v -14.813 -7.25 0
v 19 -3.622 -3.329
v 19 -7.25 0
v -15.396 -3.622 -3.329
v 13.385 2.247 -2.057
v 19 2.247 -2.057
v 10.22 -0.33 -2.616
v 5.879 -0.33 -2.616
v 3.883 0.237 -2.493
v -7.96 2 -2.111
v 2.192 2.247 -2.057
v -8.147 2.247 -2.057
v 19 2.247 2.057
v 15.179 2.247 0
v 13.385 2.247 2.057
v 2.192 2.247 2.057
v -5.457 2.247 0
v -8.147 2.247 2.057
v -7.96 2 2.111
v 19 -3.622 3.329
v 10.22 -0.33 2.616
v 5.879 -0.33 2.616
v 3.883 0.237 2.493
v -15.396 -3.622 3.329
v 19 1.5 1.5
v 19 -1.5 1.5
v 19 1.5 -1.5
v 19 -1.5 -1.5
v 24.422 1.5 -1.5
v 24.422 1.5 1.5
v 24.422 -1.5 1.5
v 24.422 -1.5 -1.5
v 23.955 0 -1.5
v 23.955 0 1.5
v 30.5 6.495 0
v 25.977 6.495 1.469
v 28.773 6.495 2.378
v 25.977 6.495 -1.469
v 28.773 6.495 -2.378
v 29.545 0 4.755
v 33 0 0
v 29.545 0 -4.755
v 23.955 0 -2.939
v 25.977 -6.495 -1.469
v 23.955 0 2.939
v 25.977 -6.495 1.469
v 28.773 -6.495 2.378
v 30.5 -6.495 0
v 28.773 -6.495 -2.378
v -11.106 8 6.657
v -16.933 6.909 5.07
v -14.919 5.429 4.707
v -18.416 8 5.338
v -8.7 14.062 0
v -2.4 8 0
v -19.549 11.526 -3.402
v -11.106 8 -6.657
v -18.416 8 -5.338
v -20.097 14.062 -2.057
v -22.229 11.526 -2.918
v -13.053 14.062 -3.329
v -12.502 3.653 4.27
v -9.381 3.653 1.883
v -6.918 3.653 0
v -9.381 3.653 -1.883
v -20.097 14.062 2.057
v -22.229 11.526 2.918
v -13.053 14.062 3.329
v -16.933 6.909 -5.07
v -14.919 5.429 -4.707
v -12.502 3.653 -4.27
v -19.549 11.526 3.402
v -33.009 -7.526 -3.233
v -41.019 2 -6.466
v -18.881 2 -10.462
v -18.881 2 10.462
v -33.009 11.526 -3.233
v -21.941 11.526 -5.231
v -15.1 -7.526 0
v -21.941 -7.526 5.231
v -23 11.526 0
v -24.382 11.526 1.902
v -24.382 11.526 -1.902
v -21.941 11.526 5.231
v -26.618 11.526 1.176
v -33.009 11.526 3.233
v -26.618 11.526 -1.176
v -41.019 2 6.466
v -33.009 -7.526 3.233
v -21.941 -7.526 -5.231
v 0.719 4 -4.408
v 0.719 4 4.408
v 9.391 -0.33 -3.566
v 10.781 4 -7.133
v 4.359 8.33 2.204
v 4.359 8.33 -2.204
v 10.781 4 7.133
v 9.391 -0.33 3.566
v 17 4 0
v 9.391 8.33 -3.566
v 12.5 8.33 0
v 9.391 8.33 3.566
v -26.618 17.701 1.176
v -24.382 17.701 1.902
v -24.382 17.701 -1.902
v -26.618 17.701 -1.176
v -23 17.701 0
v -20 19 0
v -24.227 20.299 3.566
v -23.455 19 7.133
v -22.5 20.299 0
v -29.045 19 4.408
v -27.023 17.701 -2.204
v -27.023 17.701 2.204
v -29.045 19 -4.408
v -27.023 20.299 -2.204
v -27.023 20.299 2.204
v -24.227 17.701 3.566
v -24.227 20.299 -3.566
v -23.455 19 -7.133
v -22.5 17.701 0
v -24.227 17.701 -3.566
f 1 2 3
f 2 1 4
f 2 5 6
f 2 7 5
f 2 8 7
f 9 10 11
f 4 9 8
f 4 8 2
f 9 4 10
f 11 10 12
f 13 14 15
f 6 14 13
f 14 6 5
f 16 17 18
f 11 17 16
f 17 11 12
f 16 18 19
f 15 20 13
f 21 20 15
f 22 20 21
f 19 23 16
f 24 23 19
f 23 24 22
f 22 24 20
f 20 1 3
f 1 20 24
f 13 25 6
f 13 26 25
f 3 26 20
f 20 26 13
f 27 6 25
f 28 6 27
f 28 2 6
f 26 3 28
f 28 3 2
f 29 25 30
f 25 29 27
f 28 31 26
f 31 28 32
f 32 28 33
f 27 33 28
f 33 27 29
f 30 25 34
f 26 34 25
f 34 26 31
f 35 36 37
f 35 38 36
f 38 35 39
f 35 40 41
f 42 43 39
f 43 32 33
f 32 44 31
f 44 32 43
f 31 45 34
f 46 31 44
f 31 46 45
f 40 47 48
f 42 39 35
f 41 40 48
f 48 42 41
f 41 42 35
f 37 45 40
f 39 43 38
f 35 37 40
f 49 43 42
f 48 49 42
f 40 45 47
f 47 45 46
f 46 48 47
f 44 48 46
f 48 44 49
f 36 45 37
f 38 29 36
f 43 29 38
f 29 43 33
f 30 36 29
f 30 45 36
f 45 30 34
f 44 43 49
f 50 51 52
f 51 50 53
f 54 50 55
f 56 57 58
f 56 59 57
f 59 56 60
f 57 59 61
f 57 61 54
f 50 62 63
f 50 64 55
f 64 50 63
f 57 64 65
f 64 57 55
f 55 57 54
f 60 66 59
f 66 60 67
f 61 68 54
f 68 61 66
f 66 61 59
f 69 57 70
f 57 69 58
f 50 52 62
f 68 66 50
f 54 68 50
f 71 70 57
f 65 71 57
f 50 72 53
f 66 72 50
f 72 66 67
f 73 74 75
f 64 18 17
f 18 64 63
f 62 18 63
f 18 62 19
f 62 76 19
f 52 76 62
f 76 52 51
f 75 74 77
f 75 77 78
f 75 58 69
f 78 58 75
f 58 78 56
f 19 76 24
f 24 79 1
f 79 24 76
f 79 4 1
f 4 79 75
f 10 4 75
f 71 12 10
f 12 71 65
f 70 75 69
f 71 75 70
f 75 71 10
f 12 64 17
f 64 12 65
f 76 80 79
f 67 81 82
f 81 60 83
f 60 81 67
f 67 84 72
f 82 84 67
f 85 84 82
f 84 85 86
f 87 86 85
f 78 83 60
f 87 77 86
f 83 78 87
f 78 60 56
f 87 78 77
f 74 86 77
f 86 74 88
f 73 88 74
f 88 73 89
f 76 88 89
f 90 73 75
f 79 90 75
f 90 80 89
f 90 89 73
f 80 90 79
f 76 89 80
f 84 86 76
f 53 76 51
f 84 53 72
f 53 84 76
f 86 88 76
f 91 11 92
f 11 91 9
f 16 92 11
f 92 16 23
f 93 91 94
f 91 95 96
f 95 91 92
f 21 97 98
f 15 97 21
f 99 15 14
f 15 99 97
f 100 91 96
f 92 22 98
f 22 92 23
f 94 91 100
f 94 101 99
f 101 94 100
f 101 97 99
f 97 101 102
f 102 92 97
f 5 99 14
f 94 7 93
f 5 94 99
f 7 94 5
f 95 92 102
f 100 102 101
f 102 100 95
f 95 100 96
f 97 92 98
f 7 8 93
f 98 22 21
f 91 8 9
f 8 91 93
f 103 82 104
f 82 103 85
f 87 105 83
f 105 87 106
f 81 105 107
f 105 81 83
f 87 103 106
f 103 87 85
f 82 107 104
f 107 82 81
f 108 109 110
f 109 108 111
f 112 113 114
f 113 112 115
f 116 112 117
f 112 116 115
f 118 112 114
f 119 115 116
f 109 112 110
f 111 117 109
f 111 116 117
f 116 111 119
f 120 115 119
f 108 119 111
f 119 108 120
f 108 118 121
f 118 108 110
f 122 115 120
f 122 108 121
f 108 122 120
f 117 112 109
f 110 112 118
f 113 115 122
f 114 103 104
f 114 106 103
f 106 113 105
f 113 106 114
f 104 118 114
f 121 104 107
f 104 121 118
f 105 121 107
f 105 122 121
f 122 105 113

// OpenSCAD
module transport()
{
	union() {
		translate(v = [0, 0, -2])
			scale(v = [1, 1, 1.5])
				rotate(a = 90, v = [0, 1, 0])
					cylinder(h = 38, r1 = 3.5, r2 = 3.5, center = true);
		translate(v = [20, 0, 0])
			cube(size = [20, 3, 3], center = true);
		translate(v = [28, 0, 0])
			scale(v = [1, 1, 1.5])
				sphere(r = 5);
		translate(v = [-15, 0, 8])
			scale(v = [1.8, 1, 1])
				sphere(r = 7);
			translate(v = [-25, 0, 2])
			scale(v = [1.8, 1, 1])
				sphere(r = 11);
		translate(v = [8, 0, 4])
			scale(v = [1.8, 1.5, 1])
				sphere(r = 5);
		translate(v = [-25, 0, 10])
			cylinder(h = 20, r1 = 2, r2 = 2, center = true);
		translate(v = [-25, 0, 19])
			scale(v = [1, 1.5, 0.3])
				sphere(r = 5);
	}
}

$fn = 5;

rotate(a = -90, v = [1, 0, 0])
	transport();
